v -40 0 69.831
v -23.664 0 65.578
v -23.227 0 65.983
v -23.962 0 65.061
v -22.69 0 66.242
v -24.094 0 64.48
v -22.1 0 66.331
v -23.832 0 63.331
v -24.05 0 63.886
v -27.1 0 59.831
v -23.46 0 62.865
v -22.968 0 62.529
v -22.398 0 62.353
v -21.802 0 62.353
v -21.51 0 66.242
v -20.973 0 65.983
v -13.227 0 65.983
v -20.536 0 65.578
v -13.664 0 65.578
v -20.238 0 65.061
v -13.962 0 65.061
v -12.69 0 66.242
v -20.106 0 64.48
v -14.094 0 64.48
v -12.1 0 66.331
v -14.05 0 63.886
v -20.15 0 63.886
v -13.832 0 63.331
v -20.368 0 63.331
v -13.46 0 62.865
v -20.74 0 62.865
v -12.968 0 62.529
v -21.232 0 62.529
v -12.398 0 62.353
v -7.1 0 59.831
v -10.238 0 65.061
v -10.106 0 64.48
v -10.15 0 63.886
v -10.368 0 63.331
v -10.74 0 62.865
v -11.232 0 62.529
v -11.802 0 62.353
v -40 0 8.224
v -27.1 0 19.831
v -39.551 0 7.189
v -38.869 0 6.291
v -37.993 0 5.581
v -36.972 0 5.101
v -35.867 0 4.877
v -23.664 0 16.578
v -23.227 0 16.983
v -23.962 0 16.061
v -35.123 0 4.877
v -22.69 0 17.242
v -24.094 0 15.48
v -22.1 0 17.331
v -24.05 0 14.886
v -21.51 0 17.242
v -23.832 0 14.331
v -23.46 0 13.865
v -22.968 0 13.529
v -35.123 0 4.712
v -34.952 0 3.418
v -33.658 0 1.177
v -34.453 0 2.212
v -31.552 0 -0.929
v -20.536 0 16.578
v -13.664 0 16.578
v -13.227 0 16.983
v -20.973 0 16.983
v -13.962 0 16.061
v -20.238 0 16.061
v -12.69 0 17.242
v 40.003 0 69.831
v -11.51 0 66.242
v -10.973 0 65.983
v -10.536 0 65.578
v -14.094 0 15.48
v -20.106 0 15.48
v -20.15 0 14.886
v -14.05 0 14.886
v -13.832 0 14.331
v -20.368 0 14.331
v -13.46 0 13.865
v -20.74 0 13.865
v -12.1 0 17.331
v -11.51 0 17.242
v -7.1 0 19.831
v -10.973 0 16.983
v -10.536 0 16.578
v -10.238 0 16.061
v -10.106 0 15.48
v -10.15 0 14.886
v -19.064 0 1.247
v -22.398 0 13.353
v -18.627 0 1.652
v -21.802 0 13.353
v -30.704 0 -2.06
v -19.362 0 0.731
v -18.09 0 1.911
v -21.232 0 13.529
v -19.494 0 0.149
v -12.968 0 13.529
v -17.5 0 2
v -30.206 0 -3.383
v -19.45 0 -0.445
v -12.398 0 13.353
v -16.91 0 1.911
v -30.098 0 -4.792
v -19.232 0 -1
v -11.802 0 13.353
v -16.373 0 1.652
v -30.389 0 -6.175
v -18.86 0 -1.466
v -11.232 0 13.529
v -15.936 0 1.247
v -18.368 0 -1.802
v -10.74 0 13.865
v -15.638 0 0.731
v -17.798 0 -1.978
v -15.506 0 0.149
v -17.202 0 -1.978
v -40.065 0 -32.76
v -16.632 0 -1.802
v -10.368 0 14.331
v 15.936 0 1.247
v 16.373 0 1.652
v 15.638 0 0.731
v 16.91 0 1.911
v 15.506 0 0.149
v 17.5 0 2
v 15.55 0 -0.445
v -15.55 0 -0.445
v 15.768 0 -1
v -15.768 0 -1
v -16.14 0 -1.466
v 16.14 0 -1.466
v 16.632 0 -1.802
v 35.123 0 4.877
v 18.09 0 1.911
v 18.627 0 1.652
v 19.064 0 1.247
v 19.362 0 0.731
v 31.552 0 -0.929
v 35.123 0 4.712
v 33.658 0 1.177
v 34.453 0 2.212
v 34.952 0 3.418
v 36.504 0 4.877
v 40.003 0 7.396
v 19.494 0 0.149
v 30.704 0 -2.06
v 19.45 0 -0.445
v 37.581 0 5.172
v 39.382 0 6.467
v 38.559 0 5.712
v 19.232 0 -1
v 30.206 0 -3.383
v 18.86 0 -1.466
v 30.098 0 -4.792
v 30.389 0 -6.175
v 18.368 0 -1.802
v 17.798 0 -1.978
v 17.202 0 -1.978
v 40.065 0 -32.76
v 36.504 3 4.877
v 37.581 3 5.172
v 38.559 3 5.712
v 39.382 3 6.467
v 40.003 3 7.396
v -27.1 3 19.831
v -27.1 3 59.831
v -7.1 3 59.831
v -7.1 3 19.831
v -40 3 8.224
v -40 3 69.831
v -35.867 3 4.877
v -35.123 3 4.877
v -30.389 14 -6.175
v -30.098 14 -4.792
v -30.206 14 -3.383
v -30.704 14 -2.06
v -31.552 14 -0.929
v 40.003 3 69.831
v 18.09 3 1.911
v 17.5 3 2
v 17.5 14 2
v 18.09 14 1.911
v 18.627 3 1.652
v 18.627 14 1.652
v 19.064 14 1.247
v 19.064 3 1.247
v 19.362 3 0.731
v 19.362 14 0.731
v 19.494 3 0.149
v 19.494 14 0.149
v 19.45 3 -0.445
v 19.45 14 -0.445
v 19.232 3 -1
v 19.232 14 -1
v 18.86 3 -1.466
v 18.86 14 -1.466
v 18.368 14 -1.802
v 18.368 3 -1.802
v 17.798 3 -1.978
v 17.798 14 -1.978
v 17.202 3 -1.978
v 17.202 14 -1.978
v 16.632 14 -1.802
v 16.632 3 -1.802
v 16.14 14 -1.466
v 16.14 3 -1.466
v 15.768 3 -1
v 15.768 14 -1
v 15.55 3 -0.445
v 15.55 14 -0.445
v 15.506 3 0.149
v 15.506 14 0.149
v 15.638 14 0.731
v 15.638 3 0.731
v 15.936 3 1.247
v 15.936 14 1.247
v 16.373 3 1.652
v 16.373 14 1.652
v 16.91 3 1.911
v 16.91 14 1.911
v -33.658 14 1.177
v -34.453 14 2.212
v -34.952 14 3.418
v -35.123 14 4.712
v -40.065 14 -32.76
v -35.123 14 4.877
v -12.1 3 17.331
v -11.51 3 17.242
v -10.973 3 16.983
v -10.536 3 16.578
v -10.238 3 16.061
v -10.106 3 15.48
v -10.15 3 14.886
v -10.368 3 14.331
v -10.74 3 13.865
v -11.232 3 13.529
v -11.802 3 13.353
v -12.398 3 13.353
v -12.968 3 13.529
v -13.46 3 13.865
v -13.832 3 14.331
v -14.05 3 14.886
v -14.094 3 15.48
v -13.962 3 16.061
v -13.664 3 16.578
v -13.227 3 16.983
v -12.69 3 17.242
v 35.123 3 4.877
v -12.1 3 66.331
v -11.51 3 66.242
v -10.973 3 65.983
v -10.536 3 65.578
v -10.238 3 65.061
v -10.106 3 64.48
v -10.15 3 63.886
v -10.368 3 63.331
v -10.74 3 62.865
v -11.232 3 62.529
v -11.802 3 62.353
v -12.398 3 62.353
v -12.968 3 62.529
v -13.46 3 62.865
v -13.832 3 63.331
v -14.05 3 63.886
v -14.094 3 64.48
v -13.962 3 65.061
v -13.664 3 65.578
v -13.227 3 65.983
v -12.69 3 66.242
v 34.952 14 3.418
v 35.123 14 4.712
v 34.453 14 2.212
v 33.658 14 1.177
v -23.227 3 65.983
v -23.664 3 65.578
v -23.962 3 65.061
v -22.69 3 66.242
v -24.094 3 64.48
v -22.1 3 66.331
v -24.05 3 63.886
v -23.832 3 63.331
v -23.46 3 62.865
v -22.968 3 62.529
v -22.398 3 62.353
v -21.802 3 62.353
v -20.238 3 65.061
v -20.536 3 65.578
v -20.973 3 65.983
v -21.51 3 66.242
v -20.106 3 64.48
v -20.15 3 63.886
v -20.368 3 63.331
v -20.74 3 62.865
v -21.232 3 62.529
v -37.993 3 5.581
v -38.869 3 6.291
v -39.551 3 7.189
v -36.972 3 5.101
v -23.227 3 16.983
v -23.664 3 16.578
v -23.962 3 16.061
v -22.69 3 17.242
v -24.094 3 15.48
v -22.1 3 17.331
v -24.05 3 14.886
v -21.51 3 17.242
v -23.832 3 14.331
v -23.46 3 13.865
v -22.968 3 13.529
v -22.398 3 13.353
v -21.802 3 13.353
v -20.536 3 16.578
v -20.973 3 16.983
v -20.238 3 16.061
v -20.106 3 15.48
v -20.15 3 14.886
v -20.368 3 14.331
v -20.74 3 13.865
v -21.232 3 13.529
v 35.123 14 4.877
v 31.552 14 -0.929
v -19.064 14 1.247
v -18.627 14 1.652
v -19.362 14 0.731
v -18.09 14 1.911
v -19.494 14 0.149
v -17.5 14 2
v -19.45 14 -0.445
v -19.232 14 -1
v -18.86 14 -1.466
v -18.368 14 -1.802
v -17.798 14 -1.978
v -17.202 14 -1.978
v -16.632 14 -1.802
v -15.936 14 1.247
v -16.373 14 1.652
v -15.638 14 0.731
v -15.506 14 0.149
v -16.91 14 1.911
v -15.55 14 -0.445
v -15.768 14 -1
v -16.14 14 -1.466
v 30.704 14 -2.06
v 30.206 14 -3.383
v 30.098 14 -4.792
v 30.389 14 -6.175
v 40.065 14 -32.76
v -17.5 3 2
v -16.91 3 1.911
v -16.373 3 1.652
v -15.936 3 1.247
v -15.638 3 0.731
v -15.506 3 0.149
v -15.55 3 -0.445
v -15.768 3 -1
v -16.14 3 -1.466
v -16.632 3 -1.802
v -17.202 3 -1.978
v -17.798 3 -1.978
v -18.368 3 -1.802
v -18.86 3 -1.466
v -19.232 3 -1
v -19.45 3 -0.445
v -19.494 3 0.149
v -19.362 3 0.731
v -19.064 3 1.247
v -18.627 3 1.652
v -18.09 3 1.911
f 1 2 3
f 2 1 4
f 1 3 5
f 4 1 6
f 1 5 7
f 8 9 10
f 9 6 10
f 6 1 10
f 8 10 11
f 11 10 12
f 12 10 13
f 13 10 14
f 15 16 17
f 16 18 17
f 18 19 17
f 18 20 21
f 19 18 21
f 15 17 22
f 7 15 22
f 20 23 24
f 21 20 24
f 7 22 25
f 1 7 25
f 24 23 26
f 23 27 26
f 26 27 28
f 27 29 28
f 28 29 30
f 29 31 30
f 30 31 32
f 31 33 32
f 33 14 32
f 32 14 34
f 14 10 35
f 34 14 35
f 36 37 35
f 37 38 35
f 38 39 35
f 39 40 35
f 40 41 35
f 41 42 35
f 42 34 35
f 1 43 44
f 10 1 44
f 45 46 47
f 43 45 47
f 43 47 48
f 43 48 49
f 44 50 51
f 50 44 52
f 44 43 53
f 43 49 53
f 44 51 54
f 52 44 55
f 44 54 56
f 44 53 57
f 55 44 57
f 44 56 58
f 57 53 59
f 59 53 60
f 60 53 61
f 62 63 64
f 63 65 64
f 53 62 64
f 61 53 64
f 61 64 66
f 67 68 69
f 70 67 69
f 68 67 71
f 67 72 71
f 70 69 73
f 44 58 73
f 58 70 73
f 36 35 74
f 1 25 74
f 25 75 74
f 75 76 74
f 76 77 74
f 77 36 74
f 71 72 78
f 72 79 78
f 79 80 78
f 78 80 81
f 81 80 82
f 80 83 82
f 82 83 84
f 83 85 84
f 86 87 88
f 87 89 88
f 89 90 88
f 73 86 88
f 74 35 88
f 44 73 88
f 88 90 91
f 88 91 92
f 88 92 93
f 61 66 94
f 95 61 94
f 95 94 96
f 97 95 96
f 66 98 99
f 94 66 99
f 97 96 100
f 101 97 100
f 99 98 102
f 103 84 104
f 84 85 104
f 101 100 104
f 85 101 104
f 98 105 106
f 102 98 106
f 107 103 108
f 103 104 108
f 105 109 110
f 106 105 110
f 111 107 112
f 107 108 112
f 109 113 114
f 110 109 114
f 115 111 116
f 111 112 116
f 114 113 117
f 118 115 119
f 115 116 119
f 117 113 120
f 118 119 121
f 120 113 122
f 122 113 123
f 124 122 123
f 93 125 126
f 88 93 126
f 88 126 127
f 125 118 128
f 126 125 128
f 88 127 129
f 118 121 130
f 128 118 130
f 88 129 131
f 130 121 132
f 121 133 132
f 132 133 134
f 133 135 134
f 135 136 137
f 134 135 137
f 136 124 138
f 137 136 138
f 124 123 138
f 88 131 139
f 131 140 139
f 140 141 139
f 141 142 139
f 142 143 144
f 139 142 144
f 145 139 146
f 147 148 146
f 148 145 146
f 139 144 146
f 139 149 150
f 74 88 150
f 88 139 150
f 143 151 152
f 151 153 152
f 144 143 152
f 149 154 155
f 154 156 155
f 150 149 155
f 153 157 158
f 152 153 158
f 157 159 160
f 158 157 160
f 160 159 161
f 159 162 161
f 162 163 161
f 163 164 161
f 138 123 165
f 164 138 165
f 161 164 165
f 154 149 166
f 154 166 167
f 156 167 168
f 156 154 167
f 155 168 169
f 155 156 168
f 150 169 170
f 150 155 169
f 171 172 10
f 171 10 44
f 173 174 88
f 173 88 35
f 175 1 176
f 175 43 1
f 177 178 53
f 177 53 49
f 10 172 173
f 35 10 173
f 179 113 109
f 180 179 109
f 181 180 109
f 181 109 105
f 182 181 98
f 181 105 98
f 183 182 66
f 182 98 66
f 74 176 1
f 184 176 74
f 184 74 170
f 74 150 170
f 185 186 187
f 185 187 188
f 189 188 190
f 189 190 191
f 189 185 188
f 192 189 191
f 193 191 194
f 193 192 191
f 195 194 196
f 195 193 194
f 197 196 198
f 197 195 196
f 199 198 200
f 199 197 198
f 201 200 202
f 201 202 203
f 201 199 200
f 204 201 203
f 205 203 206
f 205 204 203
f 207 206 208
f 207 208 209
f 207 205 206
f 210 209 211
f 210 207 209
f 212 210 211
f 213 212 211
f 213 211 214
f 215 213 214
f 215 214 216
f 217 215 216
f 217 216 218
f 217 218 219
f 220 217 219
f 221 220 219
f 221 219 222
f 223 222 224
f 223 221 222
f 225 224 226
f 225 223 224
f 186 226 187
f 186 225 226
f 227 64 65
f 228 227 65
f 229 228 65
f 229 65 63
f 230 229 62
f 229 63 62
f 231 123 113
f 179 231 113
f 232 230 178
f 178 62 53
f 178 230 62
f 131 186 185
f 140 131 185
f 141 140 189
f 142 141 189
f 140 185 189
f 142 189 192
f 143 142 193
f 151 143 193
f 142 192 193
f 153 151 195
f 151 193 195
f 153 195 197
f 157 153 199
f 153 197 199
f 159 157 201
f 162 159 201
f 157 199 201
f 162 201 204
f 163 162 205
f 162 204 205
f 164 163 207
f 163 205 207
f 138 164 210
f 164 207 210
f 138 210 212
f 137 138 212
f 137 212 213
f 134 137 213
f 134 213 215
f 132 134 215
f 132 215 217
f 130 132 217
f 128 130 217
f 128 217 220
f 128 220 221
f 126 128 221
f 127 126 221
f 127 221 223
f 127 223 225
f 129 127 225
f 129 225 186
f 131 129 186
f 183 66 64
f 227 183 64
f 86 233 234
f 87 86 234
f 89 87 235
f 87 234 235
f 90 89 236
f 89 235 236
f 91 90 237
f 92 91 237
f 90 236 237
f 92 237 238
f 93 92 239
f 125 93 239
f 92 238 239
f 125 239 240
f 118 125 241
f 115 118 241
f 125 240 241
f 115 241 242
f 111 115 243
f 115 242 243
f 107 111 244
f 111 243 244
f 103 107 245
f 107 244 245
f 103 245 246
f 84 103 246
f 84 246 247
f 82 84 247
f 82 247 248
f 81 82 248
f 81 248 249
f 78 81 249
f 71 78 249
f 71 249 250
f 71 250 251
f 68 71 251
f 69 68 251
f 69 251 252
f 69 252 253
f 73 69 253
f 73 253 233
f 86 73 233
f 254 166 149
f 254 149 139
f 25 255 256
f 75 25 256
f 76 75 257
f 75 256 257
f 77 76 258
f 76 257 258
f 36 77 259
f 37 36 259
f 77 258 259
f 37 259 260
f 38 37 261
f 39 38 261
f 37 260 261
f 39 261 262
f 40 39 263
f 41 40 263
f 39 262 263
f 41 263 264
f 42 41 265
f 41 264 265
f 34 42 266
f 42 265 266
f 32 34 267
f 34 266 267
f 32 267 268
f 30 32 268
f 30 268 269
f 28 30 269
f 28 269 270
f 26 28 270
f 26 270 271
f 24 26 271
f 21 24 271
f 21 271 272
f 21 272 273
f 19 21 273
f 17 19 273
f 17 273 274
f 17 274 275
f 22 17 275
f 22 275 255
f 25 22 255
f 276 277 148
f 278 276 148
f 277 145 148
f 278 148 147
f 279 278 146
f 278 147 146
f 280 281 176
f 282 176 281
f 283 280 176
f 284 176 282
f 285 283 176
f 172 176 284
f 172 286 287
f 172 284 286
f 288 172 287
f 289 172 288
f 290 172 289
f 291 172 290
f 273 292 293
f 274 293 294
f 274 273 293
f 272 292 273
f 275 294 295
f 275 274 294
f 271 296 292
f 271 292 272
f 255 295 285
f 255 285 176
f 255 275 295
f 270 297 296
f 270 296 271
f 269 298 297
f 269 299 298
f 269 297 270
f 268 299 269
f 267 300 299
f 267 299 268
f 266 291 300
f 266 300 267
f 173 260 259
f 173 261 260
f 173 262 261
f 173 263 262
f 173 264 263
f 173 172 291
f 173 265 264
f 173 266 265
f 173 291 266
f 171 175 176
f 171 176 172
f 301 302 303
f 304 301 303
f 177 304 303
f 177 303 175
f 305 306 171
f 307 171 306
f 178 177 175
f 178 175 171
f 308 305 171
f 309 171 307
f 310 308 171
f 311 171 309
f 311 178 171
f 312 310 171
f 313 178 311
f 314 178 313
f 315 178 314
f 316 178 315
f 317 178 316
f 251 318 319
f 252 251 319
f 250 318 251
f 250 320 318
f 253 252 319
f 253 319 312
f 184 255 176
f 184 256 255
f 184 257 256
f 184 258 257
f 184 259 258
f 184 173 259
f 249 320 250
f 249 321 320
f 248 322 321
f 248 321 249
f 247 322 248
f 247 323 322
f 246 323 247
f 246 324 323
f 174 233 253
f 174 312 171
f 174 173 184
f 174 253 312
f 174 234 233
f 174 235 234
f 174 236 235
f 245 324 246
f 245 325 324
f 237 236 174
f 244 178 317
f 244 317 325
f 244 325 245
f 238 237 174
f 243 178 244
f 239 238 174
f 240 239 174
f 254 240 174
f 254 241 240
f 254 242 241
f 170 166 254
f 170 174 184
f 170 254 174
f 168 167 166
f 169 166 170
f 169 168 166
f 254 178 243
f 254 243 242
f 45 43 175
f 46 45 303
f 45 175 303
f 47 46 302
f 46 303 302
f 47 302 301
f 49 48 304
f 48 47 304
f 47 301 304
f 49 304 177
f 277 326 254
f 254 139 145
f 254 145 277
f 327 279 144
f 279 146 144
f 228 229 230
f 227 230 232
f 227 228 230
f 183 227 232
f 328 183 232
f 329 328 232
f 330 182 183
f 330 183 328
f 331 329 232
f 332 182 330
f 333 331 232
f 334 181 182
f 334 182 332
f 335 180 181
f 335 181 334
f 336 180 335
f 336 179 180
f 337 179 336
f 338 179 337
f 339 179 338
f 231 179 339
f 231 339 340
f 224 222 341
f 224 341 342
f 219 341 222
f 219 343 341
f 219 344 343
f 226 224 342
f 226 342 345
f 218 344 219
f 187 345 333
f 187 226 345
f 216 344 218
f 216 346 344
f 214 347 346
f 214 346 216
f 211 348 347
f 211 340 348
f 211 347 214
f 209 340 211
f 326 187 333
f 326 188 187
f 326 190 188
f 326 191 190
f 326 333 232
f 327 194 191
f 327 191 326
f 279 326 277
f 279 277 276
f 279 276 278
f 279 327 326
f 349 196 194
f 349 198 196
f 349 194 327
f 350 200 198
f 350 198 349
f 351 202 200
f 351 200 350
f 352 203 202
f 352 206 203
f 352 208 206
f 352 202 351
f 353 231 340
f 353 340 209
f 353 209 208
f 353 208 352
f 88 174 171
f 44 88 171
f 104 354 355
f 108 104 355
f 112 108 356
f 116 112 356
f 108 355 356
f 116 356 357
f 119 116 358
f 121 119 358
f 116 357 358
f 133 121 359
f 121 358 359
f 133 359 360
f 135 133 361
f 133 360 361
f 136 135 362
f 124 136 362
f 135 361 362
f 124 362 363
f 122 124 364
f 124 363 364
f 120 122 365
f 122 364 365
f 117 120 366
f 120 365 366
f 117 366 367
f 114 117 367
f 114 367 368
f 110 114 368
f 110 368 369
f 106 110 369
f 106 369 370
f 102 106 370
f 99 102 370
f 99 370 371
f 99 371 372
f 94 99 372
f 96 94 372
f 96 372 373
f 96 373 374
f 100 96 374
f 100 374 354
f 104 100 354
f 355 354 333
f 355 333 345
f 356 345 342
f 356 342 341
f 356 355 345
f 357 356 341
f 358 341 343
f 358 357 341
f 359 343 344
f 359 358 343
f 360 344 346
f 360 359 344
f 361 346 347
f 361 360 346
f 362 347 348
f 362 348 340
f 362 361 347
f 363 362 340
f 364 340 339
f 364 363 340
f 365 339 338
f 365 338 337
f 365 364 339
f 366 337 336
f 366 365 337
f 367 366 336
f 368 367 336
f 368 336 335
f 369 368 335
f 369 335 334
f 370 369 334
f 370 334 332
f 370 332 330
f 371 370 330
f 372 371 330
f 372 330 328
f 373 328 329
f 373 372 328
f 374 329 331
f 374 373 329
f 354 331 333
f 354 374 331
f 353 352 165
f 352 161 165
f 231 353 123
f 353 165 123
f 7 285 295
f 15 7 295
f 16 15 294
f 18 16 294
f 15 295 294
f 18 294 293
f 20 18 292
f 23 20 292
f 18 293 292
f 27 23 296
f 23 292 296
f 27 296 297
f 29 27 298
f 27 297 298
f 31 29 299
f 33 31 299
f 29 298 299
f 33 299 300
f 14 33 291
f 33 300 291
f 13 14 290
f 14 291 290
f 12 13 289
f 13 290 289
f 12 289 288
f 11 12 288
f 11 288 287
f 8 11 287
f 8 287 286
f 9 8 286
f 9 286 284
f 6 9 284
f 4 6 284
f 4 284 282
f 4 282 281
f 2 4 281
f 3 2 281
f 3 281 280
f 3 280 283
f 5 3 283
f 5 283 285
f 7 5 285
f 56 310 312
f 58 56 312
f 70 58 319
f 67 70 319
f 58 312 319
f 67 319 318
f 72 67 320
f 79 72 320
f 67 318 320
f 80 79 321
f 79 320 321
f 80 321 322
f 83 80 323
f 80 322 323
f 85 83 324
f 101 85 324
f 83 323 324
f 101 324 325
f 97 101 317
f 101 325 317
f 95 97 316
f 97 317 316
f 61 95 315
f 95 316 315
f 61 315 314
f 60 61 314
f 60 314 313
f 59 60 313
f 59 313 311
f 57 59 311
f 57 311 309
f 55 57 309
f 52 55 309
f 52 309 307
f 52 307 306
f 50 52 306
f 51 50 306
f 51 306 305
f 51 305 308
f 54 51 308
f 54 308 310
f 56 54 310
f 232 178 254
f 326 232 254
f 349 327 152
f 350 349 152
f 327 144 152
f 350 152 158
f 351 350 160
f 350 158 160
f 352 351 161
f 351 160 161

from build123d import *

# Parameters (mm, degrees)
BOSS_EXTRUDE1_DEPTH        = 3
BOSS_EXTRUDE5_DEPTH        = 3
CROQUIS1_R                 = 2
CORTAR_EXTRUIR1_DEPTH      = 10
SALIENTE_EXTRUIR1_DEPTH    = 3
CORTAR_EXTRUIR2_DEPTH      = 54.947125886
CORTAR_EXTRUIR2_DEPTH_BACK = 10
CORTAR_EXTRUIR3_DEPTH      = 10
CROQUIS6_R                 = 9.410860806
CROQUIS6_R_2               = 2
SALIENTE_EXTRUIR2_DEPTH    = 11
CROQUIS8_W                 = 80.002595972
CROQUIS8_H                 = 3
SALIENTE_EXTRUIR3_DEPTH    = 33.83
CROQUIS9_R                 = 1.5
CORTAR_EXTRUIR7_DEPTH      = 33.83
CROQUIS9_3_R               = 2
CORTAR_EXTRUIR8_DEPTH      = 33.83


with BuildPart() as part:
    # Sketch1 → Boss-Extrude1 (new body)
    with BuildSketch(Plane(origin=(0, 0, 0), x_dir=(1, 0, 0), z_dir=(0, 1, 0))):
        with BuildLine():
            Line((-30.38926404, 6.174917902), (-40.065448474, 32.76001614))
            Line((-40.065448474, 32.76001614), (40.065448474, 32.76001614))
            Line((40.065448474, 32.76001614), (30.38926404, 6.174917902))
            ThreePointArc((30.38926404, 6.174917902), (30.206247108, 3.382619115), (31.552193238, 0.929283279))
            Line((31.552193238, 0.929283279), (33.658129878, -1.17665336))
            ThreePointArc((33.658129878, -1.17665336), (34.741993634, -2.798770105), (35.122595972, -4.712187266))
            Line((35.122595972, -4.712187266), (35.122595972, -23.310725409))
            Line((35.122595972, -23.310725409), (-35.122595972, -23.310725409))
            Line((-35.122595972, -23.310725409), (-35.122595972, -4.712187266))
            ThreePointArc((-35.122595972, -4.712187266), (-34.741993634, -2.798770105), (-33.658129878, -1.17665336))
            Line((-33.658129878, -1.17665336), (-31.552193238, 0.929283279))
            ThreePointArc((-31.552193238, 0.929283279), (-30.206247108, 3.382619115), (-30.38926404, 6.174917902))
        make_face()
    extrude(amount=BOSS_EXTRUDE1_DEPTH)

    # Sketch8 → Boss-Extrude5 (add)
    with BuildSketch(Plane(origin=(0, 3, 0), x_dir=(1, 0, 0), z_dir=(0, 1, 0))):
        Polygon((-35.122595972, -23.310725409), (35.122595972, -23.310725409), (25.122595972, -33.310725409), (-25.122595972, -33.310725409), align=None)
    extrude(amount=-BOSS_EXTRUDE5_DEPTH)

    # Croquis1 → Cortar-Extruir1 (cut)
    with BuildSketch(Plane(origin=(0, 3, 0), x_dir=(1, 0, 0), z_dir=(0, 1, 0))):
        with Locations(Location((-17.5, 1.614e-05, 0), (0, 0, 270))):
            Circle(CROQUIS1_R)
        with Locations(Location((17.5, 1.614e-05, 0), (0, 0, 270))):
            Circle(CROQUIS1_R)
    extrude(amount=-CORTAR_EXTRUIR1_DEPTH, mode=Mode.SUBTRACT)

    # Croquis2 → Saliente-Extruir1 (add)
    with BuildSketch(Plane(origin=(0, 3, 0), x_dir=(1, 0, 0), z_dir=(0, 1, 0))):
        Polygon((17, -36.000725409), (40.002595972, -36.000725409), (40.002595972, -33.000725409), (40.002595972, -4.877263675), (-40, -4.877263675), (-40, -36.000725409), align=None)
    extrude(amount=-SALIENTE_EXTRUIR1_DEPTH)

    # Croquis3 → Cortar-Extruir2 (cut, two sides: drawn at the far end of the back side and taken through both)
    with BuildSketch(Plane(origin=(0, 3, 0), x_dir=(1, 0, 0), z_dir=(0, 1, 0)).offset(-CORTAR_EXTRUIR2_DEPTH_BACK)):
        with BuildLine():
            ThreePointArc((36.503682563, -4.877263675), (38.558949602, -5.711743064), (40.002595972, -7.395893774))
            Line((40.002595972, -7.395893774), (40.002595972, -4.877263675))
            Line((40.002595972, -4.877263675), (36.503682563, -4.877263675))
        make_face()
    extrude(amount=CORTAR_EXTRUIR2_DEPTH + CORTAR_EXTRUIR2_DEPTH_BACK, mode=Mode.SUBTRACT)

    # Croquis4 → Cortar-Extruir3 (cut)
    with BuildSketch(Plane(origin=(0, 3, 0), x_dir=(1, 0, 0), z_dir=(0, 1, 0))):
        with BuildLine():
            ThreePointArc((-40, -8.223896962), (-38.452234257, -5.909741818), (-35.866720439, -4.877263675))
            Line((-35.866720439, -4.877263675), (-40, -4.877263675))
            Line((-40, -4.877263675), (-40, -8.223896962))
        make_face()
    extrude(amount=-CORTAR_EXTRUIR3_DEPTH, mode=Mode.SUBTRACT)

    # Croquis6 → Saliente-Extruir2 (add)
    # profile 1 of 2: a face of its own
    with BuildSketch(Plane(origin=(0, 3, 0), x_dir=(1, 0, 0), z_dir=(0, 1, 0))):
        with BuildLine():
            Line((-35.122595972, -4.877263675), (35.122595972, -4.877263675))
            Line((35.122595972, -4.877263675), (35.122595972, -4.712187266))
            ThreePointArc((35.122595972, -4.712187266), (34.741993634, -2.798770105), (33.658129878, -1.17665336))
            Line((33.658129878, -1.17665336), (31.552193238, 0.929283279))
            ThreePointArc((31.552193238, 0.929283279), (30.206247108, 3.382619115), (30.38926404, 6.174917902))
            Line((30.38926404, 6.174917902), (40.065448474, 32.76001614))
            Line((40.065448474, 32.76001614), (-40.065448474, 32.76001614))
            Line((-40.065448474, 32.76001614), (-30.38926404, 6.174917902))
            ThreePointArc((-30.38926404, 6.174917902), (-30.206247108, 3.382619115), (-31.552193238, 0.929283279))
            Line((-31.552193238, 0.929283279), (-33.658129878, -1.17665336))
            ThreePointArc((-33.658129878, -1.17665336), (-34.741993634, -2.798770105), (-35.122595972, -4.712187266))
            Line((-35.122595972, -4.712187266), (-35.122595972, -4.877263675))
        make_face()
        with Locations((-16.715825215, 19.994936592)):
            Circle(CROQUIS6_R, mode=Mode.SUBTRACT)
        with Locations(Location((-17.5, 1.614e-05, 0), (0, 0, 270))):
            Circle(CROQUIS6_R_2, mode=Mode.SUBTRACT)
        with Locations(Location((17.5, 1.614e-05, 0), (0, 0, 270))):
            Circle(CROQUIS6_R_2, mode=Mode.SUBTRACT)
    # profile 2 of 2: a face of its own
    with BuildSketch(Plane(origin=(0, 3, 0), x_dir=(1, 0, 0), z_dir=(0, 1, 0))):
        with Locations((-16.715825215, 19.994936592)):
            Circle(CROQUIS6_R)
    extrude(amount=SALIENTE_EXTRUIR2_DEPTH)

    # Croquis8 → Saliente-Extruir3 (add)
    with BuildSketch(Plane.XY.offset(36.000725409)):
        with Locations((0.001297986, 1.5)):
            Rectangle(CROQUIS8_W, CROQUIS8_H)
    extrude(amount=SALIENTE_EXTRUIR3_DEPTH)

    # Croquis9 → Cortar-Extruir7 (cut)
    # profile 1 of 2: a face of its own
    with BuildSketch(Plane(origin=(0, 3, 0), x_dir=(1, 0, 0), z_dir=(0, 1, 0))):
        Polygon((-7.6, -19.830725409), (-7.1, -19.830725409), (-7.1, -59.830725409), (-7.6, -59.830725409), (-26.6, -59.830725409), (-27.1, -59.830725409), (-27.1, -19.830725409), (-26.6, -19.830725409), align=None)
        with Locations((-17.1, -29.830725409)):
            Circle(CROQUIS9_R, mode=Mode.SUBTRACT)
    # profile 2 of 2: a face of its own
    with BuildSketch(Plane(origin=(0, 3, 0), x_dir=(1, 0, 0), z_dir=(0, 1, 0))):
        with Locations((-17.1, -29.830725409)):
            Circle(CROQUIS9_R)
    extrude(amount=-CORTAR_EXTRUIR7_DEPTH, mode=Mode.SUBTRACT)

    # Croquis9<3> → Cortar-Extruir8 (cut)
    with BuildSketch(Plane(origin=(0, 3, 0), x_dir=(1, 0, 0), z_dir=(0, 1, 0))):
        with Locations(Location((-22.1, -15.330725409, 0), (0, 0, 270))):
            Circle(CROQUIS9_3_R)
        with Locations(Location((-12.1, -15.330725409, 0), (0, 0, 270))):
            Circle(CROQUIS9_3_R)
        with Locations(Location((-22.1, -64.330725409, 0), (0, 0, 270))):
            Circle(CROQUIS9_3_R)
        with Locations(Location((-12.1, -64.330725409, 0), (0, 0, 270))):
            Circle(CROQUIS9_3_R)
    extrude(amount=-CORTAR_EXTRUIR8_DEPTH, mode=Mode.SUBTRACT)


solid = part.part
